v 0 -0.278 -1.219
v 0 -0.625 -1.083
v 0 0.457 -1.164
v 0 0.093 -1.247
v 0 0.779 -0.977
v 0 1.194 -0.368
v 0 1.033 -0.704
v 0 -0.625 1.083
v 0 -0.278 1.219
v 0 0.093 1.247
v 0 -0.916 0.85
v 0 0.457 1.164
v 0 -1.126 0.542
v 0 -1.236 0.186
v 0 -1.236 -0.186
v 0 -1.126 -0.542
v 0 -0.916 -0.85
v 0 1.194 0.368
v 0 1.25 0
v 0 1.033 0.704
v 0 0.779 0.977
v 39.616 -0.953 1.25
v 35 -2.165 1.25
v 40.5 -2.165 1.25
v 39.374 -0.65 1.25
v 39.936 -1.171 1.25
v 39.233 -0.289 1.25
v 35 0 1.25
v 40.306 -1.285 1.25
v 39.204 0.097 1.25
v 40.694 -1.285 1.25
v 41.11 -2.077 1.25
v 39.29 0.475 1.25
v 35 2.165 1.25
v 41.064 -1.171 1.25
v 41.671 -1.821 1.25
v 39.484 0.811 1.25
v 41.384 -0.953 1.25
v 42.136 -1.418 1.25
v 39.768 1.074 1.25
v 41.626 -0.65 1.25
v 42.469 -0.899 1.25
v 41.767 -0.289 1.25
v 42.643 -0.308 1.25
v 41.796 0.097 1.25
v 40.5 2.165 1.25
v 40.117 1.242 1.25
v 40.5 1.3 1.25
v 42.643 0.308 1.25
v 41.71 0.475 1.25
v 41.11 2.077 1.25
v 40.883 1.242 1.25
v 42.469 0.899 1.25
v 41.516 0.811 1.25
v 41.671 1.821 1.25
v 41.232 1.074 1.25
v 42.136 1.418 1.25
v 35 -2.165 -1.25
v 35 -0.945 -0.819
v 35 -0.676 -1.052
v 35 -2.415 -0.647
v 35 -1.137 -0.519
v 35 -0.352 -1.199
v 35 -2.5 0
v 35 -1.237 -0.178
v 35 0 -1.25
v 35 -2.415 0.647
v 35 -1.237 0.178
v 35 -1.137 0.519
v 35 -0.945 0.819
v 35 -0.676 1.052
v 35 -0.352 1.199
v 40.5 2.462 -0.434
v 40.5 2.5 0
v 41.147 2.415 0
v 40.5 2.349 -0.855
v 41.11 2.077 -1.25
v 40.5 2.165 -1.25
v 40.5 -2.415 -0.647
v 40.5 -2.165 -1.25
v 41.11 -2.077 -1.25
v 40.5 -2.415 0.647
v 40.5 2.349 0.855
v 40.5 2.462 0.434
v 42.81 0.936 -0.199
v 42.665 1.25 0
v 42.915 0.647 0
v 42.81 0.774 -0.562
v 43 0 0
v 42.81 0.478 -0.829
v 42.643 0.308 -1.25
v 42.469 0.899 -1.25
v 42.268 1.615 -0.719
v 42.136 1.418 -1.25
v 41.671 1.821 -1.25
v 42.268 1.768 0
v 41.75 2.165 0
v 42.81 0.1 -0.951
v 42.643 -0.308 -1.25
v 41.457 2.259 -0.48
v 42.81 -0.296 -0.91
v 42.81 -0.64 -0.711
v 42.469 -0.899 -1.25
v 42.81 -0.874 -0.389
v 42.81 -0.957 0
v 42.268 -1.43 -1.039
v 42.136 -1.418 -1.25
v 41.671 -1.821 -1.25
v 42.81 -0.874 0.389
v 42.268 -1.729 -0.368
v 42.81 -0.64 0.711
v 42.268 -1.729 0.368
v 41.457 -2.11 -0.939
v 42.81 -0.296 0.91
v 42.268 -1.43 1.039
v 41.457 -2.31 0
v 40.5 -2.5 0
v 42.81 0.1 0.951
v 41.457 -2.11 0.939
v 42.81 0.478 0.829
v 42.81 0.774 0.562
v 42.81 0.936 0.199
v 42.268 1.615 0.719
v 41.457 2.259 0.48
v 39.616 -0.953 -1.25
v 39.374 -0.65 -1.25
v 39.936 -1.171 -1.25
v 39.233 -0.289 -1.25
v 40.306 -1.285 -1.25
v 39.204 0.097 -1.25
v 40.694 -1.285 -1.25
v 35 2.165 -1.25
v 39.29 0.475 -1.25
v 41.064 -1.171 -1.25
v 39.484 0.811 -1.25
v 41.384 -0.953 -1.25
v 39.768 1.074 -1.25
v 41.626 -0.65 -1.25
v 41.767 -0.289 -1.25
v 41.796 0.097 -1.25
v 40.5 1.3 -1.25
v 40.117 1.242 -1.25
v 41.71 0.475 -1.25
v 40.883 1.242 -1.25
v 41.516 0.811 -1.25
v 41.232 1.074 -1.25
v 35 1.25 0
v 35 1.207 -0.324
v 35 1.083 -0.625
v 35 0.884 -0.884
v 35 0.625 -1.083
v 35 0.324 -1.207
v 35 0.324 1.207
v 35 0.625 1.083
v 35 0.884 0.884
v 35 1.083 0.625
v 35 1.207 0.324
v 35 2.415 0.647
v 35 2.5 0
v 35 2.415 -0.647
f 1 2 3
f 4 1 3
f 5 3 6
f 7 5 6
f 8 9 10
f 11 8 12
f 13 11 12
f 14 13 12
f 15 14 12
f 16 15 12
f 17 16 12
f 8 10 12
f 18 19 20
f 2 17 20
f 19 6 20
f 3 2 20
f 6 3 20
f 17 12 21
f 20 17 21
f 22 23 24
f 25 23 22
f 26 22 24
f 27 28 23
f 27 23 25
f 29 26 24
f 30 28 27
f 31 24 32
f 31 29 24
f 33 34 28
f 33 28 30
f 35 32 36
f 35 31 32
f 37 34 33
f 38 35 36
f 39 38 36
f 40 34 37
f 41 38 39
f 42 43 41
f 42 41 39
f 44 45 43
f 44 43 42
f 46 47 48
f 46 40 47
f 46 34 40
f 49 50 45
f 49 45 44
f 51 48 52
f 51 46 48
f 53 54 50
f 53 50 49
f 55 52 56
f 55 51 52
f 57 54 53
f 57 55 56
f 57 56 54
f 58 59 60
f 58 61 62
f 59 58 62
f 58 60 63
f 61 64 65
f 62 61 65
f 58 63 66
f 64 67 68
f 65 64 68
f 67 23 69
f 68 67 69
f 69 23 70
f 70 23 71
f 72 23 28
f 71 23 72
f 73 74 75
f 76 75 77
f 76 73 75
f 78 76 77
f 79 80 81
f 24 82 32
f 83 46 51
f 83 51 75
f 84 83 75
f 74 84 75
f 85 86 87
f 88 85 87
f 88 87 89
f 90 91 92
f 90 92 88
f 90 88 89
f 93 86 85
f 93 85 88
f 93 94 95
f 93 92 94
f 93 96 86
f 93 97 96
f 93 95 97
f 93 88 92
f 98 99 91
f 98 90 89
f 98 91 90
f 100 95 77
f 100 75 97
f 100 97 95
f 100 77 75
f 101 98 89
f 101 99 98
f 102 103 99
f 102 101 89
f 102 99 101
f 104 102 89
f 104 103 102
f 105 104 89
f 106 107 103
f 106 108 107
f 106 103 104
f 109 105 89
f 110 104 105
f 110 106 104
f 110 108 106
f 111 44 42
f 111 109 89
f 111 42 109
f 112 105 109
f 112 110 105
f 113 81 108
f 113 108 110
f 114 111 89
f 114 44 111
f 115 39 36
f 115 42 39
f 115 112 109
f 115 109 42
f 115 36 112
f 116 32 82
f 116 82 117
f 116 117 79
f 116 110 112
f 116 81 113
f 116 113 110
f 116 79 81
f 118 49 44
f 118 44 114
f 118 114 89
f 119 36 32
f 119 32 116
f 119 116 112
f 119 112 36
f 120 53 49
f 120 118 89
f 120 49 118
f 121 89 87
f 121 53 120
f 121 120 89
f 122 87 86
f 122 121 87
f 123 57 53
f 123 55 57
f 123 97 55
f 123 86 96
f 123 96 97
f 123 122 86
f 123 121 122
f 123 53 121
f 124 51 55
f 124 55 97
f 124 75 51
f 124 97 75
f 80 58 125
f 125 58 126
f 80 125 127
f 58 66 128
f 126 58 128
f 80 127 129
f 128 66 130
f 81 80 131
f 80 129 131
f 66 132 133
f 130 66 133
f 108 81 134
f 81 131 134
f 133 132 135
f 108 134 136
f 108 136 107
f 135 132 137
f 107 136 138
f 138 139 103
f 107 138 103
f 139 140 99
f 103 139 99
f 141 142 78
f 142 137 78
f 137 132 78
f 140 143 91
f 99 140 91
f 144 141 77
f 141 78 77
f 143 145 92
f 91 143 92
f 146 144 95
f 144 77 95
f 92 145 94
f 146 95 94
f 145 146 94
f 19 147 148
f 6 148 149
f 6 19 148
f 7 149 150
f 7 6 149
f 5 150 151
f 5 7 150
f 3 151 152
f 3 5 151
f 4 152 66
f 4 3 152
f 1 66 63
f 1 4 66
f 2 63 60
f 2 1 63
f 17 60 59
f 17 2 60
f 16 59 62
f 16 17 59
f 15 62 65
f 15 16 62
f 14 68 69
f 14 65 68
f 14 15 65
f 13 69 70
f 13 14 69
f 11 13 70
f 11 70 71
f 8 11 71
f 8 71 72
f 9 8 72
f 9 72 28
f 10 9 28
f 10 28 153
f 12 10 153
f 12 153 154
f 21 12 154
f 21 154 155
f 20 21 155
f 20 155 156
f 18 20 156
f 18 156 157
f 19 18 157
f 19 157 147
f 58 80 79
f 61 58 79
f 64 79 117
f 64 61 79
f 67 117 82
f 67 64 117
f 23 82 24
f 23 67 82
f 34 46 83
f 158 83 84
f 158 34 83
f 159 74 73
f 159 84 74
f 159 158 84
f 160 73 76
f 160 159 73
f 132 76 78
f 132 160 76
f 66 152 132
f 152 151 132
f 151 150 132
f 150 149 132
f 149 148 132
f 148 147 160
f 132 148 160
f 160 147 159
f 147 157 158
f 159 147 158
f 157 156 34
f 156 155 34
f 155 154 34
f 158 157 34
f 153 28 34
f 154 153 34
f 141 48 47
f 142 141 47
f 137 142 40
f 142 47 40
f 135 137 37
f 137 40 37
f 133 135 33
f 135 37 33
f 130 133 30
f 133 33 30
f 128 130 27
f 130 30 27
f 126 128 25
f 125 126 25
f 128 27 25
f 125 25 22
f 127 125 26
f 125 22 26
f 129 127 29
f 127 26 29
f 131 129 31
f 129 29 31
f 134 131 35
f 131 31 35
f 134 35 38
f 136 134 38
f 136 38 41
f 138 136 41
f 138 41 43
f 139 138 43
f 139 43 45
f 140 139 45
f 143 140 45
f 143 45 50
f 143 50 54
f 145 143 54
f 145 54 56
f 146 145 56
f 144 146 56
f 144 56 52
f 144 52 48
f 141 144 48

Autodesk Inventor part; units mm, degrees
ref_plane "YZ Plane" through (0, 0, 0) normal (1, 0, 0) x (0, 1, 0)
ref_plane "XY Plane" through (0, 0, 0) normal (0, 0, 1) x (1, 0, 0)
sketch "Sketch1" plane through (0, 0, 0) normal (0, 0, 1) x (1, 0, 0)
  line L0 (0, 0) -> (43, 0)
  arc A0 (43, 0) -> (40.5, 2.5) centre (40.5, 0) ccw
  line L1 (40.5, 2.5) -> (35, 2.5)
  line L2 (35, 2.5) -> (35, 1.25)
  line L3 (35, 1.25) -> (0, 1.25)
  line L4 (0, 1.25) -> (0, 0)
  point P0 (0, 0.625)
  dimension "d0" = 2.5
  dimension "d1" = 5.5
  dimension "d2" = 2.5
  dimension "d3" = 40.5
revolve "Revolution1" add sketch "Sketch1" angle 360 about axis through (0, 0, 0) along (1, 0, 0)
ref_plane "Work Plane1" through (0, 5, 0) normal (0, 1, 0) x (-1, 0, 0)
sketch "Sketch2" plane through (0, 5, 0) normal (0, 1, 0) x (-1, 0, 0)
  arc A0 (-40.5, 2.5) -> (-40.5, -2.5) centre (-40.5, 0) ccw projected
  line L0 (-35, -1.25) -> (-35, 1.25) construction
  line L1 (-40.5, 2.5) -> (-40.5, -2.5) construction
  line L2 (-35, 2.5) -> (-35, -2.5) projected
  line L3 (-35, -1.25) -> (-42.6651, -1.25)
  line L4 (-35, 1.25) -> (-42.6651, 1.25)
  line L5 (-35, -2.5) -> (-40.5, -2.5) projected
  line L6 (-35, 2.5) -> (-40.5, 2.5) projected
  point P0 (0, 0)
  point P1 (-35, 0)
  dimension "d6" = 2.5
  dimension "d9" = 2.5
  dimension "d10" = 1.25
extrude "Extrusion2" cut sketch "Sketch2" against normal blind 10 contours L6 L2 L4 A0 | L3 L2 L5 A0
sketch "Sketch3" plane through (40.5, -2.1651, -1.25) normal (0, 0, -1) x (-1, 0, 0)
  arc A0 (0, 4.3301) -> (0, 0) centre (0, 2.1651) ccw projected
  point P0 (40.5, 2.1651)
hole "Hole1" at (40.5, 0, -1.25) direction (0, 0, 1) diameter 2.6 depth 2.5
equation "\"d10\" = 0.5 * d9"
properties part number "21.2"
